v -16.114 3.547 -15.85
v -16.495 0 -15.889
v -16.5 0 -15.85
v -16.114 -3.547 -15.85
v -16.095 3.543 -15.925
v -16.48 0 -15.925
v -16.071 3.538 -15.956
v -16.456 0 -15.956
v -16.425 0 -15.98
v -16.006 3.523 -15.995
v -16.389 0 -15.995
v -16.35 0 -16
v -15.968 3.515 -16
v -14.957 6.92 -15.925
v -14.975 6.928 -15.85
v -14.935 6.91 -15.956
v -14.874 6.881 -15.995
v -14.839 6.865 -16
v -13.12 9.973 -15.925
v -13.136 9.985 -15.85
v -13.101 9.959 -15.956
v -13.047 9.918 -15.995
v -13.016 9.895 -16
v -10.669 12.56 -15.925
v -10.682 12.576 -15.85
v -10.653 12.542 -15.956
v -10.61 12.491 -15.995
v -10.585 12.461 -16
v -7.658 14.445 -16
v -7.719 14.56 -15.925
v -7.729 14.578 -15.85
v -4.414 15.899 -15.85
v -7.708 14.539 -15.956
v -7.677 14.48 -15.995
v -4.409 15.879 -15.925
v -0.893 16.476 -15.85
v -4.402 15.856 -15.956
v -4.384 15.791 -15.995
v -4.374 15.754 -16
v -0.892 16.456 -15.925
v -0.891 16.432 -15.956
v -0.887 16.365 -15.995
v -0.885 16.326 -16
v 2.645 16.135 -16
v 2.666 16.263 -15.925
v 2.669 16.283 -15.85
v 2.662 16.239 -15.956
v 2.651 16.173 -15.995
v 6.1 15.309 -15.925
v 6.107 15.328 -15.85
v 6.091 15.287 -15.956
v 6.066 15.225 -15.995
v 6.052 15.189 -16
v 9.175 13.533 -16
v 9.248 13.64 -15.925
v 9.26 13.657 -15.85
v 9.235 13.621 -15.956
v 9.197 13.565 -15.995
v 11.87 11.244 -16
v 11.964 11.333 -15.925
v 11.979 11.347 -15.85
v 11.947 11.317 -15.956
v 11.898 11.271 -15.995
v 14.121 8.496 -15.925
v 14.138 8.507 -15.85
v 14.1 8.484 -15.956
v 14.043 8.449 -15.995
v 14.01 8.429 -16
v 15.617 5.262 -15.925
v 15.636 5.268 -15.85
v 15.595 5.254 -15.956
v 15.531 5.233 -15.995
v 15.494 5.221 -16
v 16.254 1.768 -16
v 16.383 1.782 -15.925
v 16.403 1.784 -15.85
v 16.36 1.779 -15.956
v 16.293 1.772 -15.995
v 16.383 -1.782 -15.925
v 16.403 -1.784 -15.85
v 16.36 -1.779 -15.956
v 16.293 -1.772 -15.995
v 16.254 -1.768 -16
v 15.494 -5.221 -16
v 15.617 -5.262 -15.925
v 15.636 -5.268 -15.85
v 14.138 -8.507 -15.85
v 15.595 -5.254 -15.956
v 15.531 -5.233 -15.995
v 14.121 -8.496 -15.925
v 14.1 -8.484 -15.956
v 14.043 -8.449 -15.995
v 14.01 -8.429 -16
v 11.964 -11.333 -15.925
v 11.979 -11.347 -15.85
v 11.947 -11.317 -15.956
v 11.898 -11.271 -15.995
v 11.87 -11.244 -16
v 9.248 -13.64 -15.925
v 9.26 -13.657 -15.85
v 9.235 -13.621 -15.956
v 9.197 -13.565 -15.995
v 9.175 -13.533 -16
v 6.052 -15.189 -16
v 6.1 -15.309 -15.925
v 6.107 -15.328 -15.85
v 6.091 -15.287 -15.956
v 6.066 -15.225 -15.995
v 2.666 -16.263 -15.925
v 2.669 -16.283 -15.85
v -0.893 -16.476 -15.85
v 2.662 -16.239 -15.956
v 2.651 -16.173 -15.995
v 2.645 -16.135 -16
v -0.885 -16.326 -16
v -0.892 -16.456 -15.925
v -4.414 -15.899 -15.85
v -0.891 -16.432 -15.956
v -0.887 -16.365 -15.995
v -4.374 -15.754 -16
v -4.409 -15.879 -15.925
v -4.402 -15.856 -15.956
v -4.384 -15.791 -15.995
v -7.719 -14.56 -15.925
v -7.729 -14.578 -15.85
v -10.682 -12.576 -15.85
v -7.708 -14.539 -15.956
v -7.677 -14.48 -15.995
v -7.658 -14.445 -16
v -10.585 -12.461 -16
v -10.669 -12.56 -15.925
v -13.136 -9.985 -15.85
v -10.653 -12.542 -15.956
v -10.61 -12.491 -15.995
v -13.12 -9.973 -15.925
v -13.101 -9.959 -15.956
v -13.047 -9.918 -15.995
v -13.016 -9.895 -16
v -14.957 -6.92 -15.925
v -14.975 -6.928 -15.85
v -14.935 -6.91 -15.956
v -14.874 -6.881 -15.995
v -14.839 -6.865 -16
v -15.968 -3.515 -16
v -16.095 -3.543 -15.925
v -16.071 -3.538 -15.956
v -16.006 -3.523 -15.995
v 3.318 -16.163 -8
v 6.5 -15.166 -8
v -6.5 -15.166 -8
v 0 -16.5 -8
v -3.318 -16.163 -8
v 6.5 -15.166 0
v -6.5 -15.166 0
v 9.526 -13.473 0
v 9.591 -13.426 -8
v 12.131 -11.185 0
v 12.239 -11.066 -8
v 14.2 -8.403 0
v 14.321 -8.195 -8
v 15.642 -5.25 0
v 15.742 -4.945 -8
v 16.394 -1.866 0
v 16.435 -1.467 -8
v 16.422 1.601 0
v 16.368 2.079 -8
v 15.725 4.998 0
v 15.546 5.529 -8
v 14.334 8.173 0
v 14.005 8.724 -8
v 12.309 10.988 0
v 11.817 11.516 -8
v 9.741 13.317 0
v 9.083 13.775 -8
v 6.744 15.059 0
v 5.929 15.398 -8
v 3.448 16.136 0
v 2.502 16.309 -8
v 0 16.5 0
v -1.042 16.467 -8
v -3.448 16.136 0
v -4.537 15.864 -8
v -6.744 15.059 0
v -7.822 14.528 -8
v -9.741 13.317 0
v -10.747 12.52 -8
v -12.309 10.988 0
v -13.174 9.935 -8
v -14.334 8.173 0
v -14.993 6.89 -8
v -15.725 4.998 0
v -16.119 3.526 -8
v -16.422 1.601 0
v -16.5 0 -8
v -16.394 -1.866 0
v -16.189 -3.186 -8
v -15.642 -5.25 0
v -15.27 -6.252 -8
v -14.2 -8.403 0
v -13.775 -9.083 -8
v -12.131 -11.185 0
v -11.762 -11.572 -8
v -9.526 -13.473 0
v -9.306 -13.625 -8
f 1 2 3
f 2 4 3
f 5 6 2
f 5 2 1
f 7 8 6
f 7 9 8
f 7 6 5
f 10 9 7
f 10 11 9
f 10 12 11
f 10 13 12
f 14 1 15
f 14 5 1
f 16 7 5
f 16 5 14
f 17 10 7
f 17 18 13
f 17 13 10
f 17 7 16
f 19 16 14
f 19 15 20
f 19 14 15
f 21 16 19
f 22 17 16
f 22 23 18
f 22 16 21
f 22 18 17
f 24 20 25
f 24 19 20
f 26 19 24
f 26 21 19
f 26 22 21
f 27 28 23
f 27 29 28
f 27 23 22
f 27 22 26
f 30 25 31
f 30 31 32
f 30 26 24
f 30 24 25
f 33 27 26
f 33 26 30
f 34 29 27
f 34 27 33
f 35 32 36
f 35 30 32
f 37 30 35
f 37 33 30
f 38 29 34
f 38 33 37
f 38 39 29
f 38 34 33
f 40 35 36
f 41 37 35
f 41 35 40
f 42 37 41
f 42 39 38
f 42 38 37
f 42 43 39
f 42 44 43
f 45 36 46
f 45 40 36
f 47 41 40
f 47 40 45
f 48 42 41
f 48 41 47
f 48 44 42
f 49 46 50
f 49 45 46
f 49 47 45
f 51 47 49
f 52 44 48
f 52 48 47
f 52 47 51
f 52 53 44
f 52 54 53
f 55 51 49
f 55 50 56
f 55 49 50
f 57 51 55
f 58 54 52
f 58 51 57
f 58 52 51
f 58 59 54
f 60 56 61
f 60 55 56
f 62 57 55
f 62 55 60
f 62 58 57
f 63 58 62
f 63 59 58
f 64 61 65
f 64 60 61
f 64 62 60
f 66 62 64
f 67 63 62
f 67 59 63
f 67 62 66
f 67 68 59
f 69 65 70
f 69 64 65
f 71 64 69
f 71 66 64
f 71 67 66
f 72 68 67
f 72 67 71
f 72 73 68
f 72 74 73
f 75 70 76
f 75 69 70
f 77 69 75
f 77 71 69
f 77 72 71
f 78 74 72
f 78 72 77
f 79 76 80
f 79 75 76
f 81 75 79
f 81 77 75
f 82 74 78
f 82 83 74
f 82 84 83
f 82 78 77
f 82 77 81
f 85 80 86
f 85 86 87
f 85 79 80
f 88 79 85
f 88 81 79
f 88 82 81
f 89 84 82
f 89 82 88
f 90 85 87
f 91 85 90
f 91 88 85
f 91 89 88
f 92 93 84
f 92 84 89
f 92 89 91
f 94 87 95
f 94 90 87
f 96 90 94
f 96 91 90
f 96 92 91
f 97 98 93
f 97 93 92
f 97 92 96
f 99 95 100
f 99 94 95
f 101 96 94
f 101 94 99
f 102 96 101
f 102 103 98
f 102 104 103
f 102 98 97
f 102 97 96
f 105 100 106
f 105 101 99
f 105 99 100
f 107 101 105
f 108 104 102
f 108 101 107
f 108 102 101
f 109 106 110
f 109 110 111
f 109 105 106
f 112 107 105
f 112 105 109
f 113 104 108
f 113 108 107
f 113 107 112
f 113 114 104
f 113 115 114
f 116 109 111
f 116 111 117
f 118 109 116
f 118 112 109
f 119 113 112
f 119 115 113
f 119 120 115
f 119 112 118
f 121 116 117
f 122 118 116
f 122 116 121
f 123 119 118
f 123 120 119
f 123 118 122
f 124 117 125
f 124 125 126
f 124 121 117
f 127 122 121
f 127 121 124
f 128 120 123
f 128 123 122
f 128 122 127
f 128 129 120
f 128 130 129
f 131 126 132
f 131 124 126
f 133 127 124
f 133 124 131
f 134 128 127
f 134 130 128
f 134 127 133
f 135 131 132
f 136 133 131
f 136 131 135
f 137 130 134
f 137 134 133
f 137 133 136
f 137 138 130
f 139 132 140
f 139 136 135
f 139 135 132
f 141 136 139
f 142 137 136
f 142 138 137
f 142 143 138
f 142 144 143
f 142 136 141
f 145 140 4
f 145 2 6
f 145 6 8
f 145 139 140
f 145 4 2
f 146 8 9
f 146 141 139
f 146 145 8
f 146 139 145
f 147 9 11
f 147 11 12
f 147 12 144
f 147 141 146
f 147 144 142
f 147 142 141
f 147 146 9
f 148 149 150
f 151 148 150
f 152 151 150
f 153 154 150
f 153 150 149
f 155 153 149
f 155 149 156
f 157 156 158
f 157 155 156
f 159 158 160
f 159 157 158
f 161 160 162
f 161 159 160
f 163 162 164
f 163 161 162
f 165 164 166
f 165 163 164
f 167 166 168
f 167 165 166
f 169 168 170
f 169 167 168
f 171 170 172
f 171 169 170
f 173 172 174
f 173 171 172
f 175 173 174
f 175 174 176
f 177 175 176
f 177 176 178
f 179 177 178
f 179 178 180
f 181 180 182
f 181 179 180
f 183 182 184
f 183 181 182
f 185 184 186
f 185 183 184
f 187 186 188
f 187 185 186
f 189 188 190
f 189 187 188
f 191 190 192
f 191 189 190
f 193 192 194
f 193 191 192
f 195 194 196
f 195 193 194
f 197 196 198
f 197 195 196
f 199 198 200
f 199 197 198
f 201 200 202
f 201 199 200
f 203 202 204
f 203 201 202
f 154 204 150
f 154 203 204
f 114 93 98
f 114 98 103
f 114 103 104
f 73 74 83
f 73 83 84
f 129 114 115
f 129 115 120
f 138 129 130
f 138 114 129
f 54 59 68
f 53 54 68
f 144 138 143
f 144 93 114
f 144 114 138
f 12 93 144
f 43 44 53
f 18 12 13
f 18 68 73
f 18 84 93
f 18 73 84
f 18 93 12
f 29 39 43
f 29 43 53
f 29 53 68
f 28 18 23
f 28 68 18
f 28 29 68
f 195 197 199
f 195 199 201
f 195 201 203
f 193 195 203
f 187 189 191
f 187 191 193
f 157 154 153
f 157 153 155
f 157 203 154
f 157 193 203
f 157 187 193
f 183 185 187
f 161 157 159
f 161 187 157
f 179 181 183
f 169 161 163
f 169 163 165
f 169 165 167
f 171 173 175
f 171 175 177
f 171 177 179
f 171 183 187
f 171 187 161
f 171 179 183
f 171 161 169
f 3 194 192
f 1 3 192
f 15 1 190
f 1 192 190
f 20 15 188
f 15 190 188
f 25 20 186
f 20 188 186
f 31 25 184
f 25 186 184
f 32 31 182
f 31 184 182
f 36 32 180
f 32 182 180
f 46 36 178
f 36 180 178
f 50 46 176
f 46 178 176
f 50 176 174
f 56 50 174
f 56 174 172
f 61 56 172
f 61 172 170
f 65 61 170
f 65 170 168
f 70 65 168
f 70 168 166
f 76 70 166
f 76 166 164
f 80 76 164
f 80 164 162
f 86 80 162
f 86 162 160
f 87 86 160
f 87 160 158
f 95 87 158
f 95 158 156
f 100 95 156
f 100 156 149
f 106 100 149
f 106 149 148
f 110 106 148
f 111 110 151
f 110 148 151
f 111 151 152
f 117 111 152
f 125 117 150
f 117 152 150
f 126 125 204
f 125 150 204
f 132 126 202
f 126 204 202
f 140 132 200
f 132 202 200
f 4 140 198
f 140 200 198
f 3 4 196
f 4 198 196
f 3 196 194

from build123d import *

# Parameters (mm, degrees)
BOSS_EXTRUDE1_DEPTH = 8
SKETCH7_R           = 16.5
BOSS_EXTRUDE2_DEPTH = 8
FILLET1_R           = 0.15


with BuildPart() as part:
    # Sketch1 → Boss-Extrude1 (new body)
    with BuildSketch(Plane.XY):
        with BuildLine():
            Line((-6.5, -15.165750888), (6.5, -15.165750888))
            ThreePointArc((6.5, -15.165750888), (0, 16.5), (-6.5, -15.165750888))
        make_face()
    extrude(amount=-BOSS_EXTRUDE1_DEPTH)

    # Sketch7 → Boss-Extrude2 (add)
    with BuildSketch(Plane(origin=(0, 0, -8), x_dir=(-1, 0, 0), z_dir=(0, 0, -1))):
        Circle(SKETCH7_R)
    extrude(amount=BOSS_EXTRUDE2_DEPTH)

    # Fillet1
    fillet1_edges = [part.edges().sort_by_distance(p)[0] for p in [
        (16.5, 0, -16),
    ]]
    fillet(fillet1_edges, radius=FILLET1_R)


solid = part.part
